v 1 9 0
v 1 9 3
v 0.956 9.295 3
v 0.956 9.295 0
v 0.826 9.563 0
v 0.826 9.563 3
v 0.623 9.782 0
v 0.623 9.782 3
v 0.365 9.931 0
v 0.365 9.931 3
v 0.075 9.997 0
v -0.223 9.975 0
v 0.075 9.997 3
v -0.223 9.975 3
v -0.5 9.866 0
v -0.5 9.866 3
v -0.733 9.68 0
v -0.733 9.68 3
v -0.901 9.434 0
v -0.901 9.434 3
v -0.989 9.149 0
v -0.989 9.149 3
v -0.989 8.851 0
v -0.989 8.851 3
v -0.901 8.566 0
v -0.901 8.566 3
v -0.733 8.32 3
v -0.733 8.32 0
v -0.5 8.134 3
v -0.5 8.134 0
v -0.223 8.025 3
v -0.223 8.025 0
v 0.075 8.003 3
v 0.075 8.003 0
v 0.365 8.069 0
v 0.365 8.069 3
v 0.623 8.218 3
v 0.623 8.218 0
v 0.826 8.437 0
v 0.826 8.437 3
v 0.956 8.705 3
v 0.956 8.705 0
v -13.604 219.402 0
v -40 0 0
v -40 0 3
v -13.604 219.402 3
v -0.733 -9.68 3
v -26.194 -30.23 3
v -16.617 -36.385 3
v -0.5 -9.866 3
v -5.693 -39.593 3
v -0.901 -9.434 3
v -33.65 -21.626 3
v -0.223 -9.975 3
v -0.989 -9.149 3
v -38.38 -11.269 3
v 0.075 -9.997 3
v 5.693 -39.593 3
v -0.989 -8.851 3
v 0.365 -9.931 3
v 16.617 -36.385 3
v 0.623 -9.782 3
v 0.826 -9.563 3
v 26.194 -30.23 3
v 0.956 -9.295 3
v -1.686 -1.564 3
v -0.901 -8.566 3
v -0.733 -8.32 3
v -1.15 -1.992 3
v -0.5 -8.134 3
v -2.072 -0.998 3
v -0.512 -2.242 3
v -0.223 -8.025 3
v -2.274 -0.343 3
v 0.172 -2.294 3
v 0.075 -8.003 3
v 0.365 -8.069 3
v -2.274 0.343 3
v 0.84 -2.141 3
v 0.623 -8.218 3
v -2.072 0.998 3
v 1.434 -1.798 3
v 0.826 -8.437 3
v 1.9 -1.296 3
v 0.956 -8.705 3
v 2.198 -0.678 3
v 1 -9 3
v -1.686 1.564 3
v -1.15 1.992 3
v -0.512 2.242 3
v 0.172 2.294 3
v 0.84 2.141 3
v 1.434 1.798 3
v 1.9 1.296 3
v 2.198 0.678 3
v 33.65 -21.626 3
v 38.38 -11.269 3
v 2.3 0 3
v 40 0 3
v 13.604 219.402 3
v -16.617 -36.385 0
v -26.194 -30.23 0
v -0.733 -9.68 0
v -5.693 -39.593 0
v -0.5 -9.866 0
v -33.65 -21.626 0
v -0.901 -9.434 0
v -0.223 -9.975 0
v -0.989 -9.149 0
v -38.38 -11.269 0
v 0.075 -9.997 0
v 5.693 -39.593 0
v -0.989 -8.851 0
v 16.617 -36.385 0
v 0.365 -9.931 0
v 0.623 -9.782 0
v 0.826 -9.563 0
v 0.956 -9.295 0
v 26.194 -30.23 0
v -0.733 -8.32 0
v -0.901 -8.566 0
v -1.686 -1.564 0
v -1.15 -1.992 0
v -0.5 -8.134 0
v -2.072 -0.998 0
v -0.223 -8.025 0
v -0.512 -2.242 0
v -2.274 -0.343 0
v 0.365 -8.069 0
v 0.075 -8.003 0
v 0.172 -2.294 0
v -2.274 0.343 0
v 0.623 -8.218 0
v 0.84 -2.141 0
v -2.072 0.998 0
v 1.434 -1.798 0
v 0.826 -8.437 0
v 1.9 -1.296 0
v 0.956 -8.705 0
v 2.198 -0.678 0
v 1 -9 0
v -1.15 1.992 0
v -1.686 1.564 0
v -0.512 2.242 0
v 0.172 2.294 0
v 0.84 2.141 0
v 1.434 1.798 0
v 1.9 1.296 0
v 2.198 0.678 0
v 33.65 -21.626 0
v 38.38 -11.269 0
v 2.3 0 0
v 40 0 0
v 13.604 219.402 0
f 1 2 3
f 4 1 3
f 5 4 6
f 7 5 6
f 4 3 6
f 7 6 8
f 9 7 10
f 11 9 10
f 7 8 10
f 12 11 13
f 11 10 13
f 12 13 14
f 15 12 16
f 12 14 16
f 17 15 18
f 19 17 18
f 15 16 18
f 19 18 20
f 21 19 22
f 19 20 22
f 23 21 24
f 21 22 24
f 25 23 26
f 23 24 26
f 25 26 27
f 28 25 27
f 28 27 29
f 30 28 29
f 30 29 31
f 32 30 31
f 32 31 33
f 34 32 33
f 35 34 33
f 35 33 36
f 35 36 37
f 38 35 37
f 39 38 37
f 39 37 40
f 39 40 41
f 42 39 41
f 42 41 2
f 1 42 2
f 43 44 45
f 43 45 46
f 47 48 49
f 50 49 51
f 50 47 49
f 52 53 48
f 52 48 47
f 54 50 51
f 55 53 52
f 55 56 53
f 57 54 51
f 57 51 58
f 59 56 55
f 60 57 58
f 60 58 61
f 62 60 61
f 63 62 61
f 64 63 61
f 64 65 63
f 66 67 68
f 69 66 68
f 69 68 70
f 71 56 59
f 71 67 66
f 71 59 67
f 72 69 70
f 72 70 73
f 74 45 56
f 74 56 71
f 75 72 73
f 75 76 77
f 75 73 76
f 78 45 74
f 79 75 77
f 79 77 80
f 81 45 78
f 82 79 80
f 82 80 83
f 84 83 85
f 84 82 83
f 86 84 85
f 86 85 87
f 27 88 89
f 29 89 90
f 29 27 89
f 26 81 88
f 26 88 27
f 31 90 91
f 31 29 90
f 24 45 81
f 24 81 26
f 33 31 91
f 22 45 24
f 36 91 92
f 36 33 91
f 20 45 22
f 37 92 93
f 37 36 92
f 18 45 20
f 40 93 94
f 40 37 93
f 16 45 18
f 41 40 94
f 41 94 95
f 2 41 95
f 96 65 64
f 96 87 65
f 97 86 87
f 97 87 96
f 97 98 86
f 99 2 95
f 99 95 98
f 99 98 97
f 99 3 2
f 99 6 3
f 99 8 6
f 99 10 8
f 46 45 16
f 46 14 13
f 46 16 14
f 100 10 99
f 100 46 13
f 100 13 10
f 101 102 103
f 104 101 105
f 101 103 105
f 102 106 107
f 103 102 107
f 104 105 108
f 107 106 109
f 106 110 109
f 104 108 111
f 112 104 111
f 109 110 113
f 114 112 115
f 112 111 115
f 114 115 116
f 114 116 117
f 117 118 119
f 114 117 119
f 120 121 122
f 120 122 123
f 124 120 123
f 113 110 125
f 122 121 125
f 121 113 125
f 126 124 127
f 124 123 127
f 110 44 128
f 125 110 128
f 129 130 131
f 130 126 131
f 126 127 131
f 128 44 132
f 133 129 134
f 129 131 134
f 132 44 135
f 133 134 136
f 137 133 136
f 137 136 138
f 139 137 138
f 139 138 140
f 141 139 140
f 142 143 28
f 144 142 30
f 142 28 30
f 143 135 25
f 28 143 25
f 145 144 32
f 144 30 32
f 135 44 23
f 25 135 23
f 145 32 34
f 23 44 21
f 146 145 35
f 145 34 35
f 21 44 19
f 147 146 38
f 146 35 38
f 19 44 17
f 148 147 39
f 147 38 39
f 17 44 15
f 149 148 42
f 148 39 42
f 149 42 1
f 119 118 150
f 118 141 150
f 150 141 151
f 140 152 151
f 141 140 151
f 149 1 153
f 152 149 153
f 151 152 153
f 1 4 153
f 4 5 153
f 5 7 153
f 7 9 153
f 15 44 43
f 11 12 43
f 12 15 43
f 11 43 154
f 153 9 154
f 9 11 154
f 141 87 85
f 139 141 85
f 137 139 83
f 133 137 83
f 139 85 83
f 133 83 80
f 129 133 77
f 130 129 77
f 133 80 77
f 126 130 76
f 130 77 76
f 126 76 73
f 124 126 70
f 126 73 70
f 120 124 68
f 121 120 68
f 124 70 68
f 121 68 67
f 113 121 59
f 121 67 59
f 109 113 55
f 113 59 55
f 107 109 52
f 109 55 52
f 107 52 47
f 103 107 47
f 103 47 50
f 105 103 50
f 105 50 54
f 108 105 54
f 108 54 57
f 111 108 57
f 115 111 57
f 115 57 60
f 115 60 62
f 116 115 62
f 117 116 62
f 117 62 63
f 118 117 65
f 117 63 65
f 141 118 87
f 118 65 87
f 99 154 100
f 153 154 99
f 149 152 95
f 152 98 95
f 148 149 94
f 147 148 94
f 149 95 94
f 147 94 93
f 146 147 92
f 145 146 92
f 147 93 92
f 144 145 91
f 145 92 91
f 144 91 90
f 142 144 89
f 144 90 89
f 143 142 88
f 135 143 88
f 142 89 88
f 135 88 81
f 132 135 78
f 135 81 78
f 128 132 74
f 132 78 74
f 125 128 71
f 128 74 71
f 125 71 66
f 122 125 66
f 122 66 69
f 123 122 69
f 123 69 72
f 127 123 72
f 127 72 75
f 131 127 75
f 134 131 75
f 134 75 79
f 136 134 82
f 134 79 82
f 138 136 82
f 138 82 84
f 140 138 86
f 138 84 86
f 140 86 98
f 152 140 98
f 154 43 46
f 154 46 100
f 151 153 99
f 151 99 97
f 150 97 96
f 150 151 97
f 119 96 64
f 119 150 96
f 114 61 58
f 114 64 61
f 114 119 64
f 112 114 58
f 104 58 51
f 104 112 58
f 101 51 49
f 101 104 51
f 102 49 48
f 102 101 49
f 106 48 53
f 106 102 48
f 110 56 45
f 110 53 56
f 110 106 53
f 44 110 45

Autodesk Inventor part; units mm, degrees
ref_plane "YZ Plane" through (0, 0, 0) normal (1, 0, 0) x (0, 1, 0)
ref_plane "XZ Plane" through (0, 0, 0) normal (0, 1, 0) x (-1, 0, 0)
ref_plane "XY Plane" through (0, 0, 0) normal (0, 0, 1) x (1, 0, 0)
sketch "Эскиз1" plane through (0, 0, 0) normal (0, 0, 1) x (1, 0, 0)
  circle A0 centre (0, 0) radius 40
  line L0 (-40, 0) -> (-13.6038, 219.402)
  line L1 (-13.6038, 219.402) -> (13.6038, 219.402)
  line L2 (13.6038, 219.402) -> (40, 0)
  line L3 (0, 0) -> (0, 40) construction
  line L4 (0, 0) -> (40, 0) construction
  point P0 (0, 219.402)
  dimension "d0" = 80
extrude "Выдавливание1" add sketch "Эскиз1" along normal blind 3 contours L0 A0 L2 | L0 L1 L2 A0
sketch "Эскиз2" plane through (0, 0, 3) normal (0, 0, 1) x (1, 0, 0)
  arc A0 (3, 2.25) -> (-3, 2.25) centre (0, 0) ccw construction
  line L0 (-1.9929, 14.1684) -> (-3, 2.25) construction
  arc A1 (1.9929, 14.1684) -> (-1.9929, 14.1684) centre (0, 14) ccw construction
  line L1 (3, 2.25) -> (1.9929, 14.1684) construction
  circle A2 centre (0, 13) radius 0.5 construction
  circle A3 centre (0, 11) radius 0.5 construction
  circle A4 centre (0, 9) radius 0.5 construction
  circle A5 centre (0, 7) radius 0.5 construction
  circle A6 centre (0, 5) radius 0.5 construction
  circle A7 centre (0, 15) radius 0.5 construction
  arc A8 (-1.9929, -14.1684) -> (1.9929, -14.1684) centre (0, -14) ccw construction
  line L2 (-3, -2.25) -> (-1.9929, -14.1684) construction
  arc A9 (-3, -2.25) -> (3, -2.25) centre (0, 0) ccw construction
  line L3 (1.9929, -14.1684) -> (3, -2.25) construction
  circle A10 centre (0, -5) radius 0.5 construction
  circle A11 centre (0, -7) radius 0.5 construction
  circle A12 centre (0, -9) radius 0.5 construction
  circle A13 centre (0, -11) radius 0.5 construction
  circle A14 centre (0, -13) radius 0.5 construction
  circle A15 centre (0, -15) radius 0.5 construction
  circle A16 centre (0, 0) radius 2.3 projected
  circle A17 centre (0, 9) radius 1
  circle A18 centre (0, -9) radius 1
  point P0 (0, 0)
  dimension "d3" = 2
  dimension "d4" = 2
extrude "Выдавливание2" cut sketch "Эскиз2" against normal blind 10
properties part number "ухо"
